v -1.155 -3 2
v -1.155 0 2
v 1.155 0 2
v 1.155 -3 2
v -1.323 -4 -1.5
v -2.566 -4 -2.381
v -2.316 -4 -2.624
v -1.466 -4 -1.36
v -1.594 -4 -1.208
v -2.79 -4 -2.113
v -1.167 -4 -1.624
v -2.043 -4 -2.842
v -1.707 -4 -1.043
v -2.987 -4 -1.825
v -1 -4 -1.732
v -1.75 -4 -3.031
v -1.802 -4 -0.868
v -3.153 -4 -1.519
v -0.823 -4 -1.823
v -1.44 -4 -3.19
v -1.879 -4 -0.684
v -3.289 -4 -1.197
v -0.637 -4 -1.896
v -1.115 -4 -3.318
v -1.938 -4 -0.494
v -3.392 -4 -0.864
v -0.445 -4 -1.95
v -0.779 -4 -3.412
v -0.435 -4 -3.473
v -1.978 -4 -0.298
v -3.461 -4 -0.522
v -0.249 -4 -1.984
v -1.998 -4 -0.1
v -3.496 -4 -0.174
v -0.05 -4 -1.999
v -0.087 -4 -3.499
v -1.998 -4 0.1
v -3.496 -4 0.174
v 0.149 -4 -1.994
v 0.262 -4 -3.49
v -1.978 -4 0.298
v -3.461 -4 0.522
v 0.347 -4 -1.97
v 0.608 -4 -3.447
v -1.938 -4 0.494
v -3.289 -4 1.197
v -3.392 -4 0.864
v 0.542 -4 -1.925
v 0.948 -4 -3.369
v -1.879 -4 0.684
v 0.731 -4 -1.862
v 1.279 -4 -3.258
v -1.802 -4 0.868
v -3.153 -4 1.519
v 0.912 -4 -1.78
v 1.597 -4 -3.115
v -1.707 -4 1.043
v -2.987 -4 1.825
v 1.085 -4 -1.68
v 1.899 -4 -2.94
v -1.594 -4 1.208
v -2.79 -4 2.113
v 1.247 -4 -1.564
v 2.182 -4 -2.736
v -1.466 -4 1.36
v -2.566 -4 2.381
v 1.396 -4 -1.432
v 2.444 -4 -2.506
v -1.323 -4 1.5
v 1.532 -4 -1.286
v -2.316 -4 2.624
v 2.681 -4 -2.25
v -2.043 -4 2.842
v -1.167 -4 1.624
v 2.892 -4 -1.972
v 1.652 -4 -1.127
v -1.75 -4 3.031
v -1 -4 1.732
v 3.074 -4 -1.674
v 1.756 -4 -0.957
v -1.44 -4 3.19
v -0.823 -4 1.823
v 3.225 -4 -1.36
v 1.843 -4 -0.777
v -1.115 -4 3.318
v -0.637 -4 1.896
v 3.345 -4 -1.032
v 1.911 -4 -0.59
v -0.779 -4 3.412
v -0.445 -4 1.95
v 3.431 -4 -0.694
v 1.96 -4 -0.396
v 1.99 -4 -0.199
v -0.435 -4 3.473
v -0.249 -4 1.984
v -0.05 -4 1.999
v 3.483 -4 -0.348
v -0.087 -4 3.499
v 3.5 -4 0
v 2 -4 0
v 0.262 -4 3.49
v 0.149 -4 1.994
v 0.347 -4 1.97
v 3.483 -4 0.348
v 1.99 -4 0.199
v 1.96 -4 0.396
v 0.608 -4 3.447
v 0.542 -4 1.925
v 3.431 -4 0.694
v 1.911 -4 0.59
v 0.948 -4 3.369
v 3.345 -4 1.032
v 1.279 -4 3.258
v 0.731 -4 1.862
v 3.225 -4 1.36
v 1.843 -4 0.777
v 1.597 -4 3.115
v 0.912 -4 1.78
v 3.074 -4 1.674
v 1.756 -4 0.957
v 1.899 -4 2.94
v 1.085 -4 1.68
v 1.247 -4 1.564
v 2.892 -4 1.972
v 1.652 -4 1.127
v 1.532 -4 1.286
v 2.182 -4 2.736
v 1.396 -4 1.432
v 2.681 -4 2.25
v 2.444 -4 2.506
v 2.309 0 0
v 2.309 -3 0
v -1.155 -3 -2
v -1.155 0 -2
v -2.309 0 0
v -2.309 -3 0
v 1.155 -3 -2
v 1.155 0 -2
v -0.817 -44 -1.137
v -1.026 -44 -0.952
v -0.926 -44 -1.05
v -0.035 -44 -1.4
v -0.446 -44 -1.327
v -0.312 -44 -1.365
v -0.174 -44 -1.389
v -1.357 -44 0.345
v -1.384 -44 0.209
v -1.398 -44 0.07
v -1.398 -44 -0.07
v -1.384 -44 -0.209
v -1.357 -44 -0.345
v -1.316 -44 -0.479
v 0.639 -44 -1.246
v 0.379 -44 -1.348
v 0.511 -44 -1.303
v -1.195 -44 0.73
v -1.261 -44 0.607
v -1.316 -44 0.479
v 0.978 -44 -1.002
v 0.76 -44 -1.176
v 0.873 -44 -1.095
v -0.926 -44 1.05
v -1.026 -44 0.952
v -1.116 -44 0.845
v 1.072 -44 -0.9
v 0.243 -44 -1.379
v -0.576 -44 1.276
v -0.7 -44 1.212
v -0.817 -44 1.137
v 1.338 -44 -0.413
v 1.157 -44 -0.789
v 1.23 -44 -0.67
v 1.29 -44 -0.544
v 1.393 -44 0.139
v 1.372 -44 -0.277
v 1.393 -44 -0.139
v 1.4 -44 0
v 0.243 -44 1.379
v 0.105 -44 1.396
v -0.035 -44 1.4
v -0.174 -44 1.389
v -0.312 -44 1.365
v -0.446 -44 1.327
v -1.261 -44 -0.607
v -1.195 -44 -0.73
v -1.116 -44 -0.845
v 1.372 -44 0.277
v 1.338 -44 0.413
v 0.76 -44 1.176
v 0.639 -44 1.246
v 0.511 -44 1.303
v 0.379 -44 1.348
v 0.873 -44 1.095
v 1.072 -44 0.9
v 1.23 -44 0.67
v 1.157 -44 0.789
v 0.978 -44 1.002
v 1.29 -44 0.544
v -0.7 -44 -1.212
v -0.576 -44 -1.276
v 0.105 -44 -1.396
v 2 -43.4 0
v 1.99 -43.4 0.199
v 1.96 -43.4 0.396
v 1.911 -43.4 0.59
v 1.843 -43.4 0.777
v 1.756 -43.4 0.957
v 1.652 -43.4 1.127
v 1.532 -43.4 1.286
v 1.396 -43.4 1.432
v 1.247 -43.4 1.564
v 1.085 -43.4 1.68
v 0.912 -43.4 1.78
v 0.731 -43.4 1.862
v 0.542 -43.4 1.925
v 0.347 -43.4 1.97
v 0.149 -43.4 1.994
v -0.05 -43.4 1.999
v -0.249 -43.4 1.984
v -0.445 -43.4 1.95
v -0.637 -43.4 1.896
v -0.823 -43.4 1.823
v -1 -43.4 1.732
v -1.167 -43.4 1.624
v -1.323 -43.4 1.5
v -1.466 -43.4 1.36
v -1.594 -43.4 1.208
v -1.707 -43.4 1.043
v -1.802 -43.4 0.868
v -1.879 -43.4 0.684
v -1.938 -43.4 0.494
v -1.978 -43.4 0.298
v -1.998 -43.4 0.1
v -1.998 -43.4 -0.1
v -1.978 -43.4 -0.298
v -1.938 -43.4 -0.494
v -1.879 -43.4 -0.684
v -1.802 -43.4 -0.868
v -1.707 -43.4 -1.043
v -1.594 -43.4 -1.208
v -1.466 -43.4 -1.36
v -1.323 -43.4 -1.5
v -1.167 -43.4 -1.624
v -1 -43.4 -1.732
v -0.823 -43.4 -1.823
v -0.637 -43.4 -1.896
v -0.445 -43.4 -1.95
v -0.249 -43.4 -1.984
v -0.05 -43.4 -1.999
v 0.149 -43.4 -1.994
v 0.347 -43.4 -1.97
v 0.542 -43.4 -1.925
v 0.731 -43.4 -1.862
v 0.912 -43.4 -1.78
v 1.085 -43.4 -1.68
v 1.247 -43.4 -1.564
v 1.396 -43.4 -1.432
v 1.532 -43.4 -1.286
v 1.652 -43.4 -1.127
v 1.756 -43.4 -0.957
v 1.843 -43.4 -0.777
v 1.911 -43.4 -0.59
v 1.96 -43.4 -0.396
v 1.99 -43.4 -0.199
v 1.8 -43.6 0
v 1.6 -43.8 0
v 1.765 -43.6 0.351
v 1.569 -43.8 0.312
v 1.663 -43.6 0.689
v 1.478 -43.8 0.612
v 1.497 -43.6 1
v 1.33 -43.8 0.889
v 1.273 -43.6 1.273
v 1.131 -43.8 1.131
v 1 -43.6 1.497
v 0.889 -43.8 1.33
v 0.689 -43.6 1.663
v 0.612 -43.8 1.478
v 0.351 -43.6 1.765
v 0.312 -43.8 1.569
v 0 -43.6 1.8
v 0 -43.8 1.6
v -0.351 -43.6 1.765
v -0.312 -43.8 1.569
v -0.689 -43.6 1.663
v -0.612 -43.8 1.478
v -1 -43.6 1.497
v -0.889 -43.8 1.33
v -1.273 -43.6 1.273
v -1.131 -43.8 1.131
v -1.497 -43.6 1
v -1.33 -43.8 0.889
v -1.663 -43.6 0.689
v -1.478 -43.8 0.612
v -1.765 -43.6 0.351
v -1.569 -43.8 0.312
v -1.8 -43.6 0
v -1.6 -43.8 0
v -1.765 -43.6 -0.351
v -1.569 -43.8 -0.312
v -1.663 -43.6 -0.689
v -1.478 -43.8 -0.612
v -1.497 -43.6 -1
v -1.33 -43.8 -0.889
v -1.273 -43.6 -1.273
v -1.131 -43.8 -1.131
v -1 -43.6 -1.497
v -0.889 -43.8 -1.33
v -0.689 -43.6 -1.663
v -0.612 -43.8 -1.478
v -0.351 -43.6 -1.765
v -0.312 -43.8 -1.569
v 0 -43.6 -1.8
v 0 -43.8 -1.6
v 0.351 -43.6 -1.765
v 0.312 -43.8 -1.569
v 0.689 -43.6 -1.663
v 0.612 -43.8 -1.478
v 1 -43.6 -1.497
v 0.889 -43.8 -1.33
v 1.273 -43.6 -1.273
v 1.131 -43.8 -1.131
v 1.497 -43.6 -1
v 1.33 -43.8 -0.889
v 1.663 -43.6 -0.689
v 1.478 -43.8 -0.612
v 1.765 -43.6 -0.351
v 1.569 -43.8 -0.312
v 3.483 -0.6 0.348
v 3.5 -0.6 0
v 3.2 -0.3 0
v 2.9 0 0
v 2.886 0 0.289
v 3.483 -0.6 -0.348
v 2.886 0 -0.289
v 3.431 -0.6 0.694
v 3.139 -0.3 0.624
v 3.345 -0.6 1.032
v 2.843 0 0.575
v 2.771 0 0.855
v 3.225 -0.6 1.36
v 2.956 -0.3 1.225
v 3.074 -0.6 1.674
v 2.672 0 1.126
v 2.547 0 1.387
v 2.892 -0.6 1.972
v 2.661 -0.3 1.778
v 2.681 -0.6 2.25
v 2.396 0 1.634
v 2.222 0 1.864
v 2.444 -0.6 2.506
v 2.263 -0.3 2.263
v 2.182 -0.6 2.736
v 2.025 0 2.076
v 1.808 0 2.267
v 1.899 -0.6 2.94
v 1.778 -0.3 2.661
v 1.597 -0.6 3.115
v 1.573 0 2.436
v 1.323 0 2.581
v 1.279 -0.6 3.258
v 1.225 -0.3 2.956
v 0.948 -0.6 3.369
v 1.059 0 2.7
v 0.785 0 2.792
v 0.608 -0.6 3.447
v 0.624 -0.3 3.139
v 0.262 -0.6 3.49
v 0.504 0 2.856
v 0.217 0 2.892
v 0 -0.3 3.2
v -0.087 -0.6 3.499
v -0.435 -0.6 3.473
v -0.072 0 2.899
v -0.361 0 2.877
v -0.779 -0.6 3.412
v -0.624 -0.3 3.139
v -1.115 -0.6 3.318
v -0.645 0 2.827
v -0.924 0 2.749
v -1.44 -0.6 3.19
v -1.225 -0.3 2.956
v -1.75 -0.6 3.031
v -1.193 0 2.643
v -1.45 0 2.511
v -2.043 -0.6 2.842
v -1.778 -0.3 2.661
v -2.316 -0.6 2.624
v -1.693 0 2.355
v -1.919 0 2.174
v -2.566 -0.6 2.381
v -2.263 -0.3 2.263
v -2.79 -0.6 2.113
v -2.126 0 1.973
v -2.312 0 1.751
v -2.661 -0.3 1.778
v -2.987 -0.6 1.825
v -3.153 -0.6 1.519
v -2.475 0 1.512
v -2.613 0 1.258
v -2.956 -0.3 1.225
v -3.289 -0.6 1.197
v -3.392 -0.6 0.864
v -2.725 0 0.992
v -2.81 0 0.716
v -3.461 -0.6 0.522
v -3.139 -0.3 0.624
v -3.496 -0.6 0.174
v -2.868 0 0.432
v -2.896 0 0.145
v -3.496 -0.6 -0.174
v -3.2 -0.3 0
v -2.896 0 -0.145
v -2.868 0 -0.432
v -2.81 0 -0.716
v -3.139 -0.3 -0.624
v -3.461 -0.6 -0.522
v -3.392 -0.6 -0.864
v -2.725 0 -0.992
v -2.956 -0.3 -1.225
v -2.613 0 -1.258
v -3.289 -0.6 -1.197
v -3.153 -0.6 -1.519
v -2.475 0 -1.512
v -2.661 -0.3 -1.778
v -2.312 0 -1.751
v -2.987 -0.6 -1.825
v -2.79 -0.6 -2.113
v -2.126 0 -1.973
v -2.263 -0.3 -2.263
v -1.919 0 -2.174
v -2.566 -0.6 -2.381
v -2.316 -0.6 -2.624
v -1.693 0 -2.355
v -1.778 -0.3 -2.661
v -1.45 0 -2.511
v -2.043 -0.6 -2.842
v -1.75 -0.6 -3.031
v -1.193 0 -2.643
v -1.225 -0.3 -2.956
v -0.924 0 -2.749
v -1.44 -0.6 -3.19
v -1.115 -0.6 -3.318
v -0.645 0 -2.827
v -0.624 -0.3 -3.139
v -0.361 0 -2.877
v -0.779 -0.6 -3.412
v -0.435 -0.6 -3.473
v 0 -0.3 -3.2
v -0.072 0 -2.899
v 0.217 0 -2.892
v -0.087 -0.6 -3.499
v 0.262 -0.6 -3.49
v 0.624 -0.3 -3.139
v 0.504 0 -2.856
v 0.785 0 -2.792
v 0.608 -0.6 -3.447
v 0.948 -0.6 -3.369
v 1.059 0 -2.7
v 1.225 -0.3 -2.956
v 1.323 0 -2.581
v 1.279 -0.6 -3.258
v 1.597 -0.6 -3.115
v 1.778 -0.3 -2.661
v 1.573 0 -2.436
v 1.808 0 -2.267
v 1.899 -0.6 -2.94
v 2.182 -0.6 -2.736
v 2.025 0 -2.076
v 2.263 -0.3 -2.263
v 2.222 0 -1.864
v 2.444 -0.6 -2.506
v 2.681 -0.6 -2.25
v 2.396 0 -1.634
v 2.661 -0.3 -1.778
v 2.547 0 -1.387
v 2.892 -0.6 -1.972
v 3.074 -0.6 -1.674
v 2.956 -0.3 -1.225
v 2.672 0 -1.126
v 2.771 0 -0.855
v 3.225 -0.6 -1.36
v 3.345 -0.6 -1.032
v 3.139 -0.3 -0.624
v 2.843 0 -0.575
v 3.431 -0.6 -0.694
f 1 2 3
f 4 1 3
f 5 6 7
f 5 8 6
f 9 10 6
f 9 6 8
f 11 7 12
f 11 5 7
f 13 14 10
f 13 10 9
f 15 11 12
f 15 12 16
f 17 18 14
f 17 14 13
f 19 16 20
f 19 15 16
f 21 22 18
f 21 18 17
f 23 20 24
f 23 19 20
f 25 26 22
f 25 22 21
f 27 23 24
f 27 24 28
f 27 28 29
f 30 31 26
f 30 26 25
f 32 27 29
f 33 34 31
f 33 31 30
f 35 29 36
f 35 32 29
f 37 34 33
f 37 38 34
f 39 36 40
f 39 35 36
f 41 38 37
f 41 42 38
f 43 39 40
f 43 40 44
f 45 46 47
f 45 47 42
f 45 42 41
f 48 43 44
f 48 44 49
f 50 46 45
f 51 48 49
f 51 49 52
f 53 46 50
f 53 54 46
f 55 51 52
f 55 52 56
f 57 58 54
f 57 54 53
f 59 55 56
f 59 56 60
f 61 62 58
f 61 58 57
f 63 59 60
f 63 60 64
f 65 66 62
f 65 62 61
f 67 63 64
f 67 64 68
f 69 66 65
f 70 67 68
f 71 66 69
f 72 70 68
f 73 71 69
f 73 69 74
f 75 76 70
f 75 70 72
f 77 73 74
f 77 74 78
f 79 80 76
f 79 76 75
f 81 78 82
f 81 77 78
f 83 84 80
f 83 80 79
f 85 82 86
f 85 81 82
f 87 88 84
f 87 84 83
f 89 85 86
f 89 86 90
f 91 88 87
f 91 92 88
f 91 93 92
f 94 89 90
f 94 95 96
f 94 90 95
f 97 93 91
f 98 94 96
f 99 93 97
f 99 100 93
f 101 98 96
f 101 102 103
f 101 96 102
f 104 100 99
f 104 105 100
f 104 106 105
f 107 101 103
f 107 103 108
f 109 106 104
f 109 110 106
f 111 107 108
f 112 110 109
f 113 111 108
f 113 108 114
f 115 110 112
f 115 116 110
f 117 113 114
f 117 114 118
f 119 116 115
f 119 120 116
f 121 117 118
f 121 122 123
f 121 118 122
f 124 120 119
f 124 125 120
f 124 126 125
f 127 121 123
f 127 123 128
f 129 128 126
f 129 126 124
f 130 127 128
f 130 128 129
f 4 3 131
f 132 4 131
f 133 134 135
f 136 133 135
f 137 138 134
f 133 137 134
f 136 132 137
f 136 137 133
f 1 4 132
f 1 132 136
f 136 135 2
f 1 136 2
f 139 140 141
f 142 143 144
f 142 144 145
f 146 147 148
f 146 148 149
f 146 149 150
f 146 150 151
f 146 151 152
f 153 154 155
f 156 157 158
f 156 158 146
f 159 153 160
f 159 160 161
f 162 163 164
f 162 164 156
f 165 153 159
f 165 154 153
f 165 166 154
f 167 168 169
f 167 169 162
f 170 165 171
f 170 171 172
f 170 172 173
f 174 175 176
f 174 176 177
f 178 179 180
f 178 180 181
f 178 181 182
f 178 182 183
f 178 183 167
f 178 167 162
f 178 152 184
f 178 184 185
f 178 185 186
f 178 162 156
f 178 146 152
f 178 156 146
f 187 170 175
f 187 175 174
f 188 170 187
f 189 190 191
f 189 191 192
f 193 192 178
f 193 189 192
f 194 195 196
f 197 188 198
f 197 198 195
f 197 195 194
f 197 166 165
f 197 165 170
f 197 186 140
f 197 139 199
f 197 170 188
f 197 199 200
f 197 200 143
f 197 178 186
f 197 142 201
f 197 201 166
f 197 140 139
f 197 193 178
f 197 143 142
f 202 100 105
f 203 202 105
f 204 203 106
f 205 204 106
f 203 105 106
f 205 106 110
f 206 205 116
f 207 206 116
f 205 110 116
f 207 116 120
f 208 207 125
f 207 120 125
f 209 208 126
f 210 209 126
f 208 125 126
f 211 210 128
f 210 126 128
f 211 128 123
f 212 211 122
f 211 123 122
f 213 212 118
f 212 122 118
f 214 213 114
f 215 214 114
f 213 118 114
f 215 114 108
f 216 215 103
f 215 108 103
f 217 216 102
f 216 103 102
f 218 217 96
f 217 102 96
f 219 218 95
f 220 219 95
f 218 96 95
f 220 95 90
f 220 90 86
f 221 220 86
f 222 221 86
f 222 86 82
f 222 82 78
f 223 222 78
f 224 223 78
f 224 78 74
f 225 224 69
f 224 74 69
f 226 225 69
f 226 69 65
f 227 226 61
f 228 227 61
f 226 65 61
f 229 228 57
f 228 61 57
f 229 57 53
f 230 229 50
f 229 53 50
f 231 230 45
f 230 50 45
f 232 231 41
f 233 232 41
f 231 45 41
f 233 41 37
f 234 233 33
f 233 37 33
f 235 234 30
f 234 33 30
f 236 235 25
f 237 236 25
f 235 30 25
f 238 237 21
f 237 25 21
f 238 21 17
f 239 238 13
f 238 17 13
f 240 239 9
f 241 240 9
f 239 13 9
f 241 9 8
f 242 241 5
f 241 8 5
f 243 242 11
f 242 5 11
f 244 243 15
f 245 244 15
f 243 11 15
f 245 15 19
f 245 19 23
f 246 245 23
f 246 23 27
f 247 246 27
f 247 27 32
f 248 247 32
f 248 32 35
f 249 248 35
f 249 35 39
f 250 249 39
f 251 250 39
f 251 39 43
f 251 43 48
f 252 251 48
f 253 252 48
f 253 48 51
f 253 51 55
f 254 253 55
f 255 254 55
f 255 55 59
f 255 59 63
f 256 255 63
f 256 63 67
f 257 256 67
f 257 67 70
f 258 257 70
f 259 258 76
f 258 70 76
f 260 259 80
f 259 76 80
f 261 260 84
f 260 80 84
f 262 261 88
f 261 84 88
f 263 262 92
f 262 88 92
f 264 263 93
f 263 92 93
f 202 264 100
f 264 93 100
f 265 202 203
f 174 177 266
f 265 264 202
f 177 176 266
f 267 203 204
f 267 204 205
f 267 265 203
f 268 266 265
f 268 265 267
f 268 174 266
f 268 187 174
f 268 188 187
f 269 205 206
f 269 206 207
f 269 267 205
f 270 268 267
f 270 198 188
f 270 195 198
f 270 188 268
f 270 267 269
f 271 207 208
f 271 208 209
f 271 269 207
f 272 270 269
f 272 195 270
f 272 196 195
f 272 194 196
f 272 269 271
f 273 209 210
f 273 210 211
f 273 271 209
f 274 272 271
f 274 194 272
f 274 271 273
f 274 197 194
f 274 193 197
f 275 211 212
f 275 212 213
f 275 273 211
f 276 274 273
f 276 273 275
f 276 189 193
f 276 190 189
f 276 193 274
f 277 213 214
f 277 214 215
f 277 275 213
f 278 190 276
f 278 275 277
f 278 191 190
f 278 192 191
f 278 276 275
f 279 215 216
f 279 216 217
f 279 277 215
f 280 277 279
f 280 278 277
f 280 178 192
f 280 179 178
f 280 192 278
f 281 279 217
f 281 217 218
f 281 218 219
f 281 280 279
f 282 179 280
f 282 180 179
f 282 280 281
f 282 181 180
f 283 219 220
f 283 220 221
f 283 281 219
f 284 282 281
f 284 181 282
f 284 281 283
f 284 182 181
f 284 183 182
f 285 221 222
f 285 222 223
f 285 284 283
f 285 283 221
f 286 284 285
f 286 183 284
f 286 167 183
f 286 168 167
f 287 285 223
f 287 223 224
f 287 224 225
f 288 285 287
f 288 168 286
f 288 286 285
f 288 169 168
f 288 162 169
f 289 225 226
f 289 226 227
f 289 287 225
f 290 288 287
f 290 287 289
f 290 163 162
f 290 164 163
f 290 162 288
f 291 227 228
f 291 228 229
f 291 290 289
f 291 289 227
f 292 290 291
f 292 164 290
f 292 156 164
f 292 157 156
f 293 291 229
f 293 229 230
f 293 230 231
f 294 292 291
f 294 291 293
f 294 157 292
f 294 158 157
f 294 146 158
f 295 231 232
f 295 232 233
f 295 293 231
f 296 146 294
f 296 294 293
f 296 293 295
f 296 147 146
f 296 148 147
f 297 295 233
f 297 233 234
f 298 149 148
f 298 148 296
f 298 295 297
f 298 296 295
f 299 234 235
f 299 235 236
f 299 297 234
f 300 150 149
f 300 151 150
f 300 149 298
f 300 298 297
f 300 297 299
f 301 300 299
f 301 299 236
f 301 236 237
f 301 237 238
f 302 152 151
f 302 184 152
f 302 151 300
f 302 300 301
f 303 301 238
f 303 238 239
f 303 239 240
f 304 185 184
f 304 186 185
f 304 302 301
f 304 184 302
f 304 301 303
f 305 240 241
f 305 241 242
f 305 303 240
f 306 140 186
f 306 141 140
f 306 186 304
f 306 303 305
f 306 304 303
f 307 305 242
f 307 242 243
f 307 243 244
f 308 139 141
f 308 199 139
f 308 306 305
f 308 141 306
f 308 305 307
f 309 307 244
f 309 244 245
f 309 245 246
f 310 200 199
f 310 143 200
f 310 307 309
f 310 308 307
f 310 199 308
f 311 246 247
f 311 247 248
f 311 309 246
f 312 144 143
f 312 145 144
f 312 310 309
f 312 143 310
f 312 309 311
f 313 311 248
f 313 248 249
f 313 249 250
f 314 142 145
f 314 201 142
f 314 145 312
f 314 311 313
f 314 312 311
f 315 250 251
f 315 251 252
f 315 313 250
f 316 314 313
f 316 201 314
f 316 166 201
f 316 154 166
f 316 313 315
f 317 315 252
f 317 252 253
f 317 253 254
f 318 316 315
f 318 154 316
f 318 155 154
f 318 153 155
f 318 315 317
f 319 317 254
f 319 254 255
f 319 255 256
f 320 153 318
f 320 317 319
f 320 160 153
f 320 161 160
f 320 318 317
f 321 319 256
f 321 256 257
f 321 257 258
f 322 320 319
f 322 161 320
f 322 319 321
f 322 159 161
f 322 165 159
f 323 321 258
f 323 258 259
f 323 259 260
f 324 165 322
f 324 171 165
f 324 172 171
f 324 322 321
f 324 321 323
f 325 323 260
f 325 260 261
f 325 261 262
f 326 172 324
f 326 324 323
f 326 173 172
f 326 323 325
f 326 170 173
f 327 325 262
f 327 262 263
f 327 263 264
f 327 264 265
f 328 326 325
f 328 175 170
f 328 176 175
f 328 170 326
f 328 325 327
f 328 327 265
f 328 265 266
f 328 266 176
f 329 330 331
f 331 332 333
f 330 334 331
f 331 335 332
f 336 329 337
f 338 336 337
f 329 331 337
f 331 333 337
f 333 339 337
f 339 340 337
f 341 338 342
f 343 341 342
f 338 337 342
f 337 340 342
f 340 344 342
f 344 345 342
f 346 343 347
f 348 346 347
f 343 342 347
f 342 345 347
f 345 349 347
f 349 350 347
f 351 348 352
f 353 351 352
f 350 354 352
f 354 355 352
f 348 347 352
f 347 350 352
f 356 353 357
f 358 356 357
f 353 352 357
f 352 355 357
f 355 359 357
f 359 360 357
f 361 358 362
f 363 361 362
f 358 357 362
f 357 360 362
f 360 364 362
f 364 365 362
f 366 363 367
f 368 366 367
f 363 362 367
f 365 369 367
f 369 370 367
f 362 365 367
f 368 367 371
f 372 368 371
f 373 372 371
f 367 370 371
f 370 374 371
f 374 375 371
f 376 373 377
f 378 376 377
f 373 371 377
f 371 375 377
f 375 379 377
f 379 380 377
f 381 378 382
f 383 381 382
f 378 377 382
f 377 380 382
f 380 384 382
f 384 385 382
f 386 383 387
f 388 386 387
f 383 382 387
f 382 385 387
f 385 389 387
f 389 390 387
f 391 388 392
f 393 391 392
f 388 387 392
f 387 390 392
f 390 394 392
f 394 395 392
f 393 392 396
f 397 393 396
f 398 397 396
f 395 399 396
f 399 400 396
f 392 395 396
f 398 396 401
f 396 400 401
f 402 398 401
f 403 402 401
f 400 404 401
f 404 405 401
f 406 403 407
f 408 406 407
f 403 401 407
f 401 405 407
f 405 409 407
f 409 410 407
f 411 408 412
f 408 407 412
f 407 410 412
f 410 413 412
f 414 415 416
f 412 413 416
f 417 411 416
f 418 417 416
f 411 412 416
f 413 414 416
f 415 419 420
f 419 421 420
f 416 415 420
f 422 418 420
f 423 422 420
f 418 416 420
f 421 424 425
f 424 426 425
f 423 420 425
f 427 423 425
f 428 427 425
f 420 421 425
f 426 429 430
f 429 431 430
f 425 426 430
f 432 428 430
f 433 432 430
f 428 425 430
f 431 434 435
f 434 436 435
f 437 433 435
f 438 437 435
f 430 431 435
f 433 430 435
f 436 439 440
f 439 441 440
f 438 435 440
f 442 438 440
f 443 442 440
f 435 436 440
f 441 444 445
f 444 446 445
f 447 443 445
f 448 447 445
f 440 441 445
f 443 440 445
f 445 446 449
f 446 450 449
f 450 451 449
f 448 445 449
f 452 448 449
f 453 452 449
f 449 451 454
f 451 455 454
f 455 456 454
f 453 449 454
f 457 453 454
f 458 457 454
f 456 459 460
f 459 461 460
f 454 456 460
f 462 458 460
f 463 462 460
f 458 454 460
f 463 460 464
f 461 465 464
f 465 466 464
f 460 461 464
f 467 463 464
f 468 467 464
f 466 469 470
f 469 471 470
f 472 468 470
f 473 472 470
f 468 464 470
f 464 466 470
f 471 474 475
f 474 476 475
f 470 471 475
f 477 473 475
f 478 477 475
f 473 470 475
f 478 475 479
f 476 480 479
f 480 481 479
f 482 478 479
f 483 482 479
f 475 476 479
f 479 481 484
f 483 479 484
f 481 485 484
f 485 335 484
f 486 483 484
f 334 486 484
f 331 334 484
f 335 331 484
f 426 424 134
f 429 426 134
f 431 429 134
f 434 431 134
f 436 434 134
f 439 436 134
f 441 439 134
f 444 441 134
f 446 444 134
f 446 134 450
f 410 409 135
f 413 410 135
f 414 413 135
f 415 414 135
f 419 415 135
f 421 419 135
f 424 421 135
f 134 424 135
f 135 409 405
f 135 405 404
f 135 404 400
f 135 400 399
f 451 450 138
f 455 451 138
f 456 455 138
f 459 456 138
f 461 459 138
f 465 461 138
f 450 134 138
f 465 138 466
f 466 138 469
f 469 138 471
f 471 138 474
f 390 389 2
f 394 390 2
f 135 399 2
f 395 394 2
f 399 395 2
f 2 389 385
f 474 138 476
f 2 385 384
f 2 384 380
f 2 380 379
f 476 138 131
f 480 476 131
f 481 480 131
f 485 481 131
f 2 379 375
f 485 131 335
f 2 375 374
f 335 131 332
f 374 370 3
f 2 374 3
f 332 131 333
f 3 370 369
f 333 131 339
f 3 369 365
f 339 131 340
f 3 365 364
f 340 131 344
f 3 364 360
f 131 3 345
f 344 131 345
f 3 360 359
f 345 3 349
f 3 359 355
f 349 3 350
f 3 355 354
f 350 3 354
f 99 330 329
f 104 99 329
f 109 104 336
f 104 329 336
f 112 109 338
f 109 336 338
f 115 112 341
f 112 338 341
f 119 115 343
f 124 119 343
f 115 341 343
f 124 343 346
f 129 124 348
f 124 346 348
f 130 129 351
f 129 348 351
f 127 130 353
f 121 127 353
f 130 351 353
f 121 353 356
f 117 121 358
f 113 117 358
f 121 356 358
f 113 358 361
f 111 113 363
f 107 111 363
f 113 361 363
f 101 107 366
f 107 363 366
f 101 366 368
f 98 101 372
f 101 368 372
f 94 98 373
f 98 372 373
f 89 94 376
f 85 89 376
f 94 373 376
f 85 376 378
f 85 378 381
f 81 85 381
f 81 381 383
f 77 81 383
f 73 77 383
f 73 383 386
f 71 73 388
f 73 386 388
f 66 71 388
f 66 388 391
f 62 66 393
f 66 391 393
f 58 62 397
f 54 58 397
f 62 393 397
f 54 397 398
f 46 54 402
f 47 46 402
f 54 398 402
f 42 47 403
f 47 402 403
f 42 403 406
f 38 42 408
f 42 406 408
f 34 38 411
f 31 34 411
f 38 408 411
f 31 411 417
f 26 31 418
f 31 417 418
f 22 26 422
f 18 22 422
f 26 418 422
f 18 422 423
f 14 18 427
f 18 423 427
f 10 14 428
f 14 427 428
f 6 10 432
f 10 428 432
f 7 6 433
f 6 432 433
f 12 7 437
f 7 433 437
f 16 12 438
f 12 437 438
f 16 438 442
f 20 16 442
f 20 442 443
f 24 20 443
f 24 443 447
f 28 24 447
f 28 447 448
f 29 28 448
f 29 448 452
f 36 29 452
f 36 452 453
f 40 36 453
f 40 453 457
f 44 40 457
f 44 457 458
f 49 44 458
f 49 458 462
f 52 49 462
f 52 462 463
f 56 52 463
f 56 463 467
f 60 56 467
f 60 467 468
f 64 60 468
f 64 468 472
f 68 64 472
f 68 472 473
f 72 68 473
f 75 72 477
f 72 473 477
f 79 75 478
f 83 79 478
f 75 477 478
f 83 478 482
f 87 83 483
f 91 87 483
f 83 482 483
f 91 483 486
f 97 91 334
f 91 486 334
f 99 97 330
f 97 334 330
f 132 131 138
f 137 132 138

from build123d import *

# Parameters (mm, degrees)
F0_R     = 3.5
F1_DEPTH = 4
F2_R     = 2
F3_DEPTH = 40
F5_DEPTH = 3
F6_SIZE  = 0.6


with BuildPart() as f1:
    # F0 (on Front) → F1 (new body)
    with BuildSketch(Plane.XZ):
        Circle(F0_R)
    extrude(amount=F1_DEPTH)

    # F2 (on face) → F3 (join)
    with BuildSketch(Plane.XZ.offset(4)):
        Circle(F2_R)
    extrude(amount=F3_DEPTH)

    # F4 (on face) → F5 (cut)
    with BuildSketch(Plane(origin=(0, 0, 0), x_dir=(-1, 0, 0), z_dir=(0, 1, 0))):
        Polygon((1.154701, 2), (-1.154701, 2), (-2.309401, 0), (-1.154701, -2), (1.154701, -2), (2.309401, 0), align=None)
    extrude(amount=-F5_DEPTH, mode=Mode.SUBTRACT)

    # F6
    f6_edges = [f1.edges().sort_by_distance(p)[0] for p in [
        (-3.5, 0, 0),
        (-2, -44, 0),
    ]]
    chamfer(f6_edges, length=F6_SIZE)


solid = f1.part
